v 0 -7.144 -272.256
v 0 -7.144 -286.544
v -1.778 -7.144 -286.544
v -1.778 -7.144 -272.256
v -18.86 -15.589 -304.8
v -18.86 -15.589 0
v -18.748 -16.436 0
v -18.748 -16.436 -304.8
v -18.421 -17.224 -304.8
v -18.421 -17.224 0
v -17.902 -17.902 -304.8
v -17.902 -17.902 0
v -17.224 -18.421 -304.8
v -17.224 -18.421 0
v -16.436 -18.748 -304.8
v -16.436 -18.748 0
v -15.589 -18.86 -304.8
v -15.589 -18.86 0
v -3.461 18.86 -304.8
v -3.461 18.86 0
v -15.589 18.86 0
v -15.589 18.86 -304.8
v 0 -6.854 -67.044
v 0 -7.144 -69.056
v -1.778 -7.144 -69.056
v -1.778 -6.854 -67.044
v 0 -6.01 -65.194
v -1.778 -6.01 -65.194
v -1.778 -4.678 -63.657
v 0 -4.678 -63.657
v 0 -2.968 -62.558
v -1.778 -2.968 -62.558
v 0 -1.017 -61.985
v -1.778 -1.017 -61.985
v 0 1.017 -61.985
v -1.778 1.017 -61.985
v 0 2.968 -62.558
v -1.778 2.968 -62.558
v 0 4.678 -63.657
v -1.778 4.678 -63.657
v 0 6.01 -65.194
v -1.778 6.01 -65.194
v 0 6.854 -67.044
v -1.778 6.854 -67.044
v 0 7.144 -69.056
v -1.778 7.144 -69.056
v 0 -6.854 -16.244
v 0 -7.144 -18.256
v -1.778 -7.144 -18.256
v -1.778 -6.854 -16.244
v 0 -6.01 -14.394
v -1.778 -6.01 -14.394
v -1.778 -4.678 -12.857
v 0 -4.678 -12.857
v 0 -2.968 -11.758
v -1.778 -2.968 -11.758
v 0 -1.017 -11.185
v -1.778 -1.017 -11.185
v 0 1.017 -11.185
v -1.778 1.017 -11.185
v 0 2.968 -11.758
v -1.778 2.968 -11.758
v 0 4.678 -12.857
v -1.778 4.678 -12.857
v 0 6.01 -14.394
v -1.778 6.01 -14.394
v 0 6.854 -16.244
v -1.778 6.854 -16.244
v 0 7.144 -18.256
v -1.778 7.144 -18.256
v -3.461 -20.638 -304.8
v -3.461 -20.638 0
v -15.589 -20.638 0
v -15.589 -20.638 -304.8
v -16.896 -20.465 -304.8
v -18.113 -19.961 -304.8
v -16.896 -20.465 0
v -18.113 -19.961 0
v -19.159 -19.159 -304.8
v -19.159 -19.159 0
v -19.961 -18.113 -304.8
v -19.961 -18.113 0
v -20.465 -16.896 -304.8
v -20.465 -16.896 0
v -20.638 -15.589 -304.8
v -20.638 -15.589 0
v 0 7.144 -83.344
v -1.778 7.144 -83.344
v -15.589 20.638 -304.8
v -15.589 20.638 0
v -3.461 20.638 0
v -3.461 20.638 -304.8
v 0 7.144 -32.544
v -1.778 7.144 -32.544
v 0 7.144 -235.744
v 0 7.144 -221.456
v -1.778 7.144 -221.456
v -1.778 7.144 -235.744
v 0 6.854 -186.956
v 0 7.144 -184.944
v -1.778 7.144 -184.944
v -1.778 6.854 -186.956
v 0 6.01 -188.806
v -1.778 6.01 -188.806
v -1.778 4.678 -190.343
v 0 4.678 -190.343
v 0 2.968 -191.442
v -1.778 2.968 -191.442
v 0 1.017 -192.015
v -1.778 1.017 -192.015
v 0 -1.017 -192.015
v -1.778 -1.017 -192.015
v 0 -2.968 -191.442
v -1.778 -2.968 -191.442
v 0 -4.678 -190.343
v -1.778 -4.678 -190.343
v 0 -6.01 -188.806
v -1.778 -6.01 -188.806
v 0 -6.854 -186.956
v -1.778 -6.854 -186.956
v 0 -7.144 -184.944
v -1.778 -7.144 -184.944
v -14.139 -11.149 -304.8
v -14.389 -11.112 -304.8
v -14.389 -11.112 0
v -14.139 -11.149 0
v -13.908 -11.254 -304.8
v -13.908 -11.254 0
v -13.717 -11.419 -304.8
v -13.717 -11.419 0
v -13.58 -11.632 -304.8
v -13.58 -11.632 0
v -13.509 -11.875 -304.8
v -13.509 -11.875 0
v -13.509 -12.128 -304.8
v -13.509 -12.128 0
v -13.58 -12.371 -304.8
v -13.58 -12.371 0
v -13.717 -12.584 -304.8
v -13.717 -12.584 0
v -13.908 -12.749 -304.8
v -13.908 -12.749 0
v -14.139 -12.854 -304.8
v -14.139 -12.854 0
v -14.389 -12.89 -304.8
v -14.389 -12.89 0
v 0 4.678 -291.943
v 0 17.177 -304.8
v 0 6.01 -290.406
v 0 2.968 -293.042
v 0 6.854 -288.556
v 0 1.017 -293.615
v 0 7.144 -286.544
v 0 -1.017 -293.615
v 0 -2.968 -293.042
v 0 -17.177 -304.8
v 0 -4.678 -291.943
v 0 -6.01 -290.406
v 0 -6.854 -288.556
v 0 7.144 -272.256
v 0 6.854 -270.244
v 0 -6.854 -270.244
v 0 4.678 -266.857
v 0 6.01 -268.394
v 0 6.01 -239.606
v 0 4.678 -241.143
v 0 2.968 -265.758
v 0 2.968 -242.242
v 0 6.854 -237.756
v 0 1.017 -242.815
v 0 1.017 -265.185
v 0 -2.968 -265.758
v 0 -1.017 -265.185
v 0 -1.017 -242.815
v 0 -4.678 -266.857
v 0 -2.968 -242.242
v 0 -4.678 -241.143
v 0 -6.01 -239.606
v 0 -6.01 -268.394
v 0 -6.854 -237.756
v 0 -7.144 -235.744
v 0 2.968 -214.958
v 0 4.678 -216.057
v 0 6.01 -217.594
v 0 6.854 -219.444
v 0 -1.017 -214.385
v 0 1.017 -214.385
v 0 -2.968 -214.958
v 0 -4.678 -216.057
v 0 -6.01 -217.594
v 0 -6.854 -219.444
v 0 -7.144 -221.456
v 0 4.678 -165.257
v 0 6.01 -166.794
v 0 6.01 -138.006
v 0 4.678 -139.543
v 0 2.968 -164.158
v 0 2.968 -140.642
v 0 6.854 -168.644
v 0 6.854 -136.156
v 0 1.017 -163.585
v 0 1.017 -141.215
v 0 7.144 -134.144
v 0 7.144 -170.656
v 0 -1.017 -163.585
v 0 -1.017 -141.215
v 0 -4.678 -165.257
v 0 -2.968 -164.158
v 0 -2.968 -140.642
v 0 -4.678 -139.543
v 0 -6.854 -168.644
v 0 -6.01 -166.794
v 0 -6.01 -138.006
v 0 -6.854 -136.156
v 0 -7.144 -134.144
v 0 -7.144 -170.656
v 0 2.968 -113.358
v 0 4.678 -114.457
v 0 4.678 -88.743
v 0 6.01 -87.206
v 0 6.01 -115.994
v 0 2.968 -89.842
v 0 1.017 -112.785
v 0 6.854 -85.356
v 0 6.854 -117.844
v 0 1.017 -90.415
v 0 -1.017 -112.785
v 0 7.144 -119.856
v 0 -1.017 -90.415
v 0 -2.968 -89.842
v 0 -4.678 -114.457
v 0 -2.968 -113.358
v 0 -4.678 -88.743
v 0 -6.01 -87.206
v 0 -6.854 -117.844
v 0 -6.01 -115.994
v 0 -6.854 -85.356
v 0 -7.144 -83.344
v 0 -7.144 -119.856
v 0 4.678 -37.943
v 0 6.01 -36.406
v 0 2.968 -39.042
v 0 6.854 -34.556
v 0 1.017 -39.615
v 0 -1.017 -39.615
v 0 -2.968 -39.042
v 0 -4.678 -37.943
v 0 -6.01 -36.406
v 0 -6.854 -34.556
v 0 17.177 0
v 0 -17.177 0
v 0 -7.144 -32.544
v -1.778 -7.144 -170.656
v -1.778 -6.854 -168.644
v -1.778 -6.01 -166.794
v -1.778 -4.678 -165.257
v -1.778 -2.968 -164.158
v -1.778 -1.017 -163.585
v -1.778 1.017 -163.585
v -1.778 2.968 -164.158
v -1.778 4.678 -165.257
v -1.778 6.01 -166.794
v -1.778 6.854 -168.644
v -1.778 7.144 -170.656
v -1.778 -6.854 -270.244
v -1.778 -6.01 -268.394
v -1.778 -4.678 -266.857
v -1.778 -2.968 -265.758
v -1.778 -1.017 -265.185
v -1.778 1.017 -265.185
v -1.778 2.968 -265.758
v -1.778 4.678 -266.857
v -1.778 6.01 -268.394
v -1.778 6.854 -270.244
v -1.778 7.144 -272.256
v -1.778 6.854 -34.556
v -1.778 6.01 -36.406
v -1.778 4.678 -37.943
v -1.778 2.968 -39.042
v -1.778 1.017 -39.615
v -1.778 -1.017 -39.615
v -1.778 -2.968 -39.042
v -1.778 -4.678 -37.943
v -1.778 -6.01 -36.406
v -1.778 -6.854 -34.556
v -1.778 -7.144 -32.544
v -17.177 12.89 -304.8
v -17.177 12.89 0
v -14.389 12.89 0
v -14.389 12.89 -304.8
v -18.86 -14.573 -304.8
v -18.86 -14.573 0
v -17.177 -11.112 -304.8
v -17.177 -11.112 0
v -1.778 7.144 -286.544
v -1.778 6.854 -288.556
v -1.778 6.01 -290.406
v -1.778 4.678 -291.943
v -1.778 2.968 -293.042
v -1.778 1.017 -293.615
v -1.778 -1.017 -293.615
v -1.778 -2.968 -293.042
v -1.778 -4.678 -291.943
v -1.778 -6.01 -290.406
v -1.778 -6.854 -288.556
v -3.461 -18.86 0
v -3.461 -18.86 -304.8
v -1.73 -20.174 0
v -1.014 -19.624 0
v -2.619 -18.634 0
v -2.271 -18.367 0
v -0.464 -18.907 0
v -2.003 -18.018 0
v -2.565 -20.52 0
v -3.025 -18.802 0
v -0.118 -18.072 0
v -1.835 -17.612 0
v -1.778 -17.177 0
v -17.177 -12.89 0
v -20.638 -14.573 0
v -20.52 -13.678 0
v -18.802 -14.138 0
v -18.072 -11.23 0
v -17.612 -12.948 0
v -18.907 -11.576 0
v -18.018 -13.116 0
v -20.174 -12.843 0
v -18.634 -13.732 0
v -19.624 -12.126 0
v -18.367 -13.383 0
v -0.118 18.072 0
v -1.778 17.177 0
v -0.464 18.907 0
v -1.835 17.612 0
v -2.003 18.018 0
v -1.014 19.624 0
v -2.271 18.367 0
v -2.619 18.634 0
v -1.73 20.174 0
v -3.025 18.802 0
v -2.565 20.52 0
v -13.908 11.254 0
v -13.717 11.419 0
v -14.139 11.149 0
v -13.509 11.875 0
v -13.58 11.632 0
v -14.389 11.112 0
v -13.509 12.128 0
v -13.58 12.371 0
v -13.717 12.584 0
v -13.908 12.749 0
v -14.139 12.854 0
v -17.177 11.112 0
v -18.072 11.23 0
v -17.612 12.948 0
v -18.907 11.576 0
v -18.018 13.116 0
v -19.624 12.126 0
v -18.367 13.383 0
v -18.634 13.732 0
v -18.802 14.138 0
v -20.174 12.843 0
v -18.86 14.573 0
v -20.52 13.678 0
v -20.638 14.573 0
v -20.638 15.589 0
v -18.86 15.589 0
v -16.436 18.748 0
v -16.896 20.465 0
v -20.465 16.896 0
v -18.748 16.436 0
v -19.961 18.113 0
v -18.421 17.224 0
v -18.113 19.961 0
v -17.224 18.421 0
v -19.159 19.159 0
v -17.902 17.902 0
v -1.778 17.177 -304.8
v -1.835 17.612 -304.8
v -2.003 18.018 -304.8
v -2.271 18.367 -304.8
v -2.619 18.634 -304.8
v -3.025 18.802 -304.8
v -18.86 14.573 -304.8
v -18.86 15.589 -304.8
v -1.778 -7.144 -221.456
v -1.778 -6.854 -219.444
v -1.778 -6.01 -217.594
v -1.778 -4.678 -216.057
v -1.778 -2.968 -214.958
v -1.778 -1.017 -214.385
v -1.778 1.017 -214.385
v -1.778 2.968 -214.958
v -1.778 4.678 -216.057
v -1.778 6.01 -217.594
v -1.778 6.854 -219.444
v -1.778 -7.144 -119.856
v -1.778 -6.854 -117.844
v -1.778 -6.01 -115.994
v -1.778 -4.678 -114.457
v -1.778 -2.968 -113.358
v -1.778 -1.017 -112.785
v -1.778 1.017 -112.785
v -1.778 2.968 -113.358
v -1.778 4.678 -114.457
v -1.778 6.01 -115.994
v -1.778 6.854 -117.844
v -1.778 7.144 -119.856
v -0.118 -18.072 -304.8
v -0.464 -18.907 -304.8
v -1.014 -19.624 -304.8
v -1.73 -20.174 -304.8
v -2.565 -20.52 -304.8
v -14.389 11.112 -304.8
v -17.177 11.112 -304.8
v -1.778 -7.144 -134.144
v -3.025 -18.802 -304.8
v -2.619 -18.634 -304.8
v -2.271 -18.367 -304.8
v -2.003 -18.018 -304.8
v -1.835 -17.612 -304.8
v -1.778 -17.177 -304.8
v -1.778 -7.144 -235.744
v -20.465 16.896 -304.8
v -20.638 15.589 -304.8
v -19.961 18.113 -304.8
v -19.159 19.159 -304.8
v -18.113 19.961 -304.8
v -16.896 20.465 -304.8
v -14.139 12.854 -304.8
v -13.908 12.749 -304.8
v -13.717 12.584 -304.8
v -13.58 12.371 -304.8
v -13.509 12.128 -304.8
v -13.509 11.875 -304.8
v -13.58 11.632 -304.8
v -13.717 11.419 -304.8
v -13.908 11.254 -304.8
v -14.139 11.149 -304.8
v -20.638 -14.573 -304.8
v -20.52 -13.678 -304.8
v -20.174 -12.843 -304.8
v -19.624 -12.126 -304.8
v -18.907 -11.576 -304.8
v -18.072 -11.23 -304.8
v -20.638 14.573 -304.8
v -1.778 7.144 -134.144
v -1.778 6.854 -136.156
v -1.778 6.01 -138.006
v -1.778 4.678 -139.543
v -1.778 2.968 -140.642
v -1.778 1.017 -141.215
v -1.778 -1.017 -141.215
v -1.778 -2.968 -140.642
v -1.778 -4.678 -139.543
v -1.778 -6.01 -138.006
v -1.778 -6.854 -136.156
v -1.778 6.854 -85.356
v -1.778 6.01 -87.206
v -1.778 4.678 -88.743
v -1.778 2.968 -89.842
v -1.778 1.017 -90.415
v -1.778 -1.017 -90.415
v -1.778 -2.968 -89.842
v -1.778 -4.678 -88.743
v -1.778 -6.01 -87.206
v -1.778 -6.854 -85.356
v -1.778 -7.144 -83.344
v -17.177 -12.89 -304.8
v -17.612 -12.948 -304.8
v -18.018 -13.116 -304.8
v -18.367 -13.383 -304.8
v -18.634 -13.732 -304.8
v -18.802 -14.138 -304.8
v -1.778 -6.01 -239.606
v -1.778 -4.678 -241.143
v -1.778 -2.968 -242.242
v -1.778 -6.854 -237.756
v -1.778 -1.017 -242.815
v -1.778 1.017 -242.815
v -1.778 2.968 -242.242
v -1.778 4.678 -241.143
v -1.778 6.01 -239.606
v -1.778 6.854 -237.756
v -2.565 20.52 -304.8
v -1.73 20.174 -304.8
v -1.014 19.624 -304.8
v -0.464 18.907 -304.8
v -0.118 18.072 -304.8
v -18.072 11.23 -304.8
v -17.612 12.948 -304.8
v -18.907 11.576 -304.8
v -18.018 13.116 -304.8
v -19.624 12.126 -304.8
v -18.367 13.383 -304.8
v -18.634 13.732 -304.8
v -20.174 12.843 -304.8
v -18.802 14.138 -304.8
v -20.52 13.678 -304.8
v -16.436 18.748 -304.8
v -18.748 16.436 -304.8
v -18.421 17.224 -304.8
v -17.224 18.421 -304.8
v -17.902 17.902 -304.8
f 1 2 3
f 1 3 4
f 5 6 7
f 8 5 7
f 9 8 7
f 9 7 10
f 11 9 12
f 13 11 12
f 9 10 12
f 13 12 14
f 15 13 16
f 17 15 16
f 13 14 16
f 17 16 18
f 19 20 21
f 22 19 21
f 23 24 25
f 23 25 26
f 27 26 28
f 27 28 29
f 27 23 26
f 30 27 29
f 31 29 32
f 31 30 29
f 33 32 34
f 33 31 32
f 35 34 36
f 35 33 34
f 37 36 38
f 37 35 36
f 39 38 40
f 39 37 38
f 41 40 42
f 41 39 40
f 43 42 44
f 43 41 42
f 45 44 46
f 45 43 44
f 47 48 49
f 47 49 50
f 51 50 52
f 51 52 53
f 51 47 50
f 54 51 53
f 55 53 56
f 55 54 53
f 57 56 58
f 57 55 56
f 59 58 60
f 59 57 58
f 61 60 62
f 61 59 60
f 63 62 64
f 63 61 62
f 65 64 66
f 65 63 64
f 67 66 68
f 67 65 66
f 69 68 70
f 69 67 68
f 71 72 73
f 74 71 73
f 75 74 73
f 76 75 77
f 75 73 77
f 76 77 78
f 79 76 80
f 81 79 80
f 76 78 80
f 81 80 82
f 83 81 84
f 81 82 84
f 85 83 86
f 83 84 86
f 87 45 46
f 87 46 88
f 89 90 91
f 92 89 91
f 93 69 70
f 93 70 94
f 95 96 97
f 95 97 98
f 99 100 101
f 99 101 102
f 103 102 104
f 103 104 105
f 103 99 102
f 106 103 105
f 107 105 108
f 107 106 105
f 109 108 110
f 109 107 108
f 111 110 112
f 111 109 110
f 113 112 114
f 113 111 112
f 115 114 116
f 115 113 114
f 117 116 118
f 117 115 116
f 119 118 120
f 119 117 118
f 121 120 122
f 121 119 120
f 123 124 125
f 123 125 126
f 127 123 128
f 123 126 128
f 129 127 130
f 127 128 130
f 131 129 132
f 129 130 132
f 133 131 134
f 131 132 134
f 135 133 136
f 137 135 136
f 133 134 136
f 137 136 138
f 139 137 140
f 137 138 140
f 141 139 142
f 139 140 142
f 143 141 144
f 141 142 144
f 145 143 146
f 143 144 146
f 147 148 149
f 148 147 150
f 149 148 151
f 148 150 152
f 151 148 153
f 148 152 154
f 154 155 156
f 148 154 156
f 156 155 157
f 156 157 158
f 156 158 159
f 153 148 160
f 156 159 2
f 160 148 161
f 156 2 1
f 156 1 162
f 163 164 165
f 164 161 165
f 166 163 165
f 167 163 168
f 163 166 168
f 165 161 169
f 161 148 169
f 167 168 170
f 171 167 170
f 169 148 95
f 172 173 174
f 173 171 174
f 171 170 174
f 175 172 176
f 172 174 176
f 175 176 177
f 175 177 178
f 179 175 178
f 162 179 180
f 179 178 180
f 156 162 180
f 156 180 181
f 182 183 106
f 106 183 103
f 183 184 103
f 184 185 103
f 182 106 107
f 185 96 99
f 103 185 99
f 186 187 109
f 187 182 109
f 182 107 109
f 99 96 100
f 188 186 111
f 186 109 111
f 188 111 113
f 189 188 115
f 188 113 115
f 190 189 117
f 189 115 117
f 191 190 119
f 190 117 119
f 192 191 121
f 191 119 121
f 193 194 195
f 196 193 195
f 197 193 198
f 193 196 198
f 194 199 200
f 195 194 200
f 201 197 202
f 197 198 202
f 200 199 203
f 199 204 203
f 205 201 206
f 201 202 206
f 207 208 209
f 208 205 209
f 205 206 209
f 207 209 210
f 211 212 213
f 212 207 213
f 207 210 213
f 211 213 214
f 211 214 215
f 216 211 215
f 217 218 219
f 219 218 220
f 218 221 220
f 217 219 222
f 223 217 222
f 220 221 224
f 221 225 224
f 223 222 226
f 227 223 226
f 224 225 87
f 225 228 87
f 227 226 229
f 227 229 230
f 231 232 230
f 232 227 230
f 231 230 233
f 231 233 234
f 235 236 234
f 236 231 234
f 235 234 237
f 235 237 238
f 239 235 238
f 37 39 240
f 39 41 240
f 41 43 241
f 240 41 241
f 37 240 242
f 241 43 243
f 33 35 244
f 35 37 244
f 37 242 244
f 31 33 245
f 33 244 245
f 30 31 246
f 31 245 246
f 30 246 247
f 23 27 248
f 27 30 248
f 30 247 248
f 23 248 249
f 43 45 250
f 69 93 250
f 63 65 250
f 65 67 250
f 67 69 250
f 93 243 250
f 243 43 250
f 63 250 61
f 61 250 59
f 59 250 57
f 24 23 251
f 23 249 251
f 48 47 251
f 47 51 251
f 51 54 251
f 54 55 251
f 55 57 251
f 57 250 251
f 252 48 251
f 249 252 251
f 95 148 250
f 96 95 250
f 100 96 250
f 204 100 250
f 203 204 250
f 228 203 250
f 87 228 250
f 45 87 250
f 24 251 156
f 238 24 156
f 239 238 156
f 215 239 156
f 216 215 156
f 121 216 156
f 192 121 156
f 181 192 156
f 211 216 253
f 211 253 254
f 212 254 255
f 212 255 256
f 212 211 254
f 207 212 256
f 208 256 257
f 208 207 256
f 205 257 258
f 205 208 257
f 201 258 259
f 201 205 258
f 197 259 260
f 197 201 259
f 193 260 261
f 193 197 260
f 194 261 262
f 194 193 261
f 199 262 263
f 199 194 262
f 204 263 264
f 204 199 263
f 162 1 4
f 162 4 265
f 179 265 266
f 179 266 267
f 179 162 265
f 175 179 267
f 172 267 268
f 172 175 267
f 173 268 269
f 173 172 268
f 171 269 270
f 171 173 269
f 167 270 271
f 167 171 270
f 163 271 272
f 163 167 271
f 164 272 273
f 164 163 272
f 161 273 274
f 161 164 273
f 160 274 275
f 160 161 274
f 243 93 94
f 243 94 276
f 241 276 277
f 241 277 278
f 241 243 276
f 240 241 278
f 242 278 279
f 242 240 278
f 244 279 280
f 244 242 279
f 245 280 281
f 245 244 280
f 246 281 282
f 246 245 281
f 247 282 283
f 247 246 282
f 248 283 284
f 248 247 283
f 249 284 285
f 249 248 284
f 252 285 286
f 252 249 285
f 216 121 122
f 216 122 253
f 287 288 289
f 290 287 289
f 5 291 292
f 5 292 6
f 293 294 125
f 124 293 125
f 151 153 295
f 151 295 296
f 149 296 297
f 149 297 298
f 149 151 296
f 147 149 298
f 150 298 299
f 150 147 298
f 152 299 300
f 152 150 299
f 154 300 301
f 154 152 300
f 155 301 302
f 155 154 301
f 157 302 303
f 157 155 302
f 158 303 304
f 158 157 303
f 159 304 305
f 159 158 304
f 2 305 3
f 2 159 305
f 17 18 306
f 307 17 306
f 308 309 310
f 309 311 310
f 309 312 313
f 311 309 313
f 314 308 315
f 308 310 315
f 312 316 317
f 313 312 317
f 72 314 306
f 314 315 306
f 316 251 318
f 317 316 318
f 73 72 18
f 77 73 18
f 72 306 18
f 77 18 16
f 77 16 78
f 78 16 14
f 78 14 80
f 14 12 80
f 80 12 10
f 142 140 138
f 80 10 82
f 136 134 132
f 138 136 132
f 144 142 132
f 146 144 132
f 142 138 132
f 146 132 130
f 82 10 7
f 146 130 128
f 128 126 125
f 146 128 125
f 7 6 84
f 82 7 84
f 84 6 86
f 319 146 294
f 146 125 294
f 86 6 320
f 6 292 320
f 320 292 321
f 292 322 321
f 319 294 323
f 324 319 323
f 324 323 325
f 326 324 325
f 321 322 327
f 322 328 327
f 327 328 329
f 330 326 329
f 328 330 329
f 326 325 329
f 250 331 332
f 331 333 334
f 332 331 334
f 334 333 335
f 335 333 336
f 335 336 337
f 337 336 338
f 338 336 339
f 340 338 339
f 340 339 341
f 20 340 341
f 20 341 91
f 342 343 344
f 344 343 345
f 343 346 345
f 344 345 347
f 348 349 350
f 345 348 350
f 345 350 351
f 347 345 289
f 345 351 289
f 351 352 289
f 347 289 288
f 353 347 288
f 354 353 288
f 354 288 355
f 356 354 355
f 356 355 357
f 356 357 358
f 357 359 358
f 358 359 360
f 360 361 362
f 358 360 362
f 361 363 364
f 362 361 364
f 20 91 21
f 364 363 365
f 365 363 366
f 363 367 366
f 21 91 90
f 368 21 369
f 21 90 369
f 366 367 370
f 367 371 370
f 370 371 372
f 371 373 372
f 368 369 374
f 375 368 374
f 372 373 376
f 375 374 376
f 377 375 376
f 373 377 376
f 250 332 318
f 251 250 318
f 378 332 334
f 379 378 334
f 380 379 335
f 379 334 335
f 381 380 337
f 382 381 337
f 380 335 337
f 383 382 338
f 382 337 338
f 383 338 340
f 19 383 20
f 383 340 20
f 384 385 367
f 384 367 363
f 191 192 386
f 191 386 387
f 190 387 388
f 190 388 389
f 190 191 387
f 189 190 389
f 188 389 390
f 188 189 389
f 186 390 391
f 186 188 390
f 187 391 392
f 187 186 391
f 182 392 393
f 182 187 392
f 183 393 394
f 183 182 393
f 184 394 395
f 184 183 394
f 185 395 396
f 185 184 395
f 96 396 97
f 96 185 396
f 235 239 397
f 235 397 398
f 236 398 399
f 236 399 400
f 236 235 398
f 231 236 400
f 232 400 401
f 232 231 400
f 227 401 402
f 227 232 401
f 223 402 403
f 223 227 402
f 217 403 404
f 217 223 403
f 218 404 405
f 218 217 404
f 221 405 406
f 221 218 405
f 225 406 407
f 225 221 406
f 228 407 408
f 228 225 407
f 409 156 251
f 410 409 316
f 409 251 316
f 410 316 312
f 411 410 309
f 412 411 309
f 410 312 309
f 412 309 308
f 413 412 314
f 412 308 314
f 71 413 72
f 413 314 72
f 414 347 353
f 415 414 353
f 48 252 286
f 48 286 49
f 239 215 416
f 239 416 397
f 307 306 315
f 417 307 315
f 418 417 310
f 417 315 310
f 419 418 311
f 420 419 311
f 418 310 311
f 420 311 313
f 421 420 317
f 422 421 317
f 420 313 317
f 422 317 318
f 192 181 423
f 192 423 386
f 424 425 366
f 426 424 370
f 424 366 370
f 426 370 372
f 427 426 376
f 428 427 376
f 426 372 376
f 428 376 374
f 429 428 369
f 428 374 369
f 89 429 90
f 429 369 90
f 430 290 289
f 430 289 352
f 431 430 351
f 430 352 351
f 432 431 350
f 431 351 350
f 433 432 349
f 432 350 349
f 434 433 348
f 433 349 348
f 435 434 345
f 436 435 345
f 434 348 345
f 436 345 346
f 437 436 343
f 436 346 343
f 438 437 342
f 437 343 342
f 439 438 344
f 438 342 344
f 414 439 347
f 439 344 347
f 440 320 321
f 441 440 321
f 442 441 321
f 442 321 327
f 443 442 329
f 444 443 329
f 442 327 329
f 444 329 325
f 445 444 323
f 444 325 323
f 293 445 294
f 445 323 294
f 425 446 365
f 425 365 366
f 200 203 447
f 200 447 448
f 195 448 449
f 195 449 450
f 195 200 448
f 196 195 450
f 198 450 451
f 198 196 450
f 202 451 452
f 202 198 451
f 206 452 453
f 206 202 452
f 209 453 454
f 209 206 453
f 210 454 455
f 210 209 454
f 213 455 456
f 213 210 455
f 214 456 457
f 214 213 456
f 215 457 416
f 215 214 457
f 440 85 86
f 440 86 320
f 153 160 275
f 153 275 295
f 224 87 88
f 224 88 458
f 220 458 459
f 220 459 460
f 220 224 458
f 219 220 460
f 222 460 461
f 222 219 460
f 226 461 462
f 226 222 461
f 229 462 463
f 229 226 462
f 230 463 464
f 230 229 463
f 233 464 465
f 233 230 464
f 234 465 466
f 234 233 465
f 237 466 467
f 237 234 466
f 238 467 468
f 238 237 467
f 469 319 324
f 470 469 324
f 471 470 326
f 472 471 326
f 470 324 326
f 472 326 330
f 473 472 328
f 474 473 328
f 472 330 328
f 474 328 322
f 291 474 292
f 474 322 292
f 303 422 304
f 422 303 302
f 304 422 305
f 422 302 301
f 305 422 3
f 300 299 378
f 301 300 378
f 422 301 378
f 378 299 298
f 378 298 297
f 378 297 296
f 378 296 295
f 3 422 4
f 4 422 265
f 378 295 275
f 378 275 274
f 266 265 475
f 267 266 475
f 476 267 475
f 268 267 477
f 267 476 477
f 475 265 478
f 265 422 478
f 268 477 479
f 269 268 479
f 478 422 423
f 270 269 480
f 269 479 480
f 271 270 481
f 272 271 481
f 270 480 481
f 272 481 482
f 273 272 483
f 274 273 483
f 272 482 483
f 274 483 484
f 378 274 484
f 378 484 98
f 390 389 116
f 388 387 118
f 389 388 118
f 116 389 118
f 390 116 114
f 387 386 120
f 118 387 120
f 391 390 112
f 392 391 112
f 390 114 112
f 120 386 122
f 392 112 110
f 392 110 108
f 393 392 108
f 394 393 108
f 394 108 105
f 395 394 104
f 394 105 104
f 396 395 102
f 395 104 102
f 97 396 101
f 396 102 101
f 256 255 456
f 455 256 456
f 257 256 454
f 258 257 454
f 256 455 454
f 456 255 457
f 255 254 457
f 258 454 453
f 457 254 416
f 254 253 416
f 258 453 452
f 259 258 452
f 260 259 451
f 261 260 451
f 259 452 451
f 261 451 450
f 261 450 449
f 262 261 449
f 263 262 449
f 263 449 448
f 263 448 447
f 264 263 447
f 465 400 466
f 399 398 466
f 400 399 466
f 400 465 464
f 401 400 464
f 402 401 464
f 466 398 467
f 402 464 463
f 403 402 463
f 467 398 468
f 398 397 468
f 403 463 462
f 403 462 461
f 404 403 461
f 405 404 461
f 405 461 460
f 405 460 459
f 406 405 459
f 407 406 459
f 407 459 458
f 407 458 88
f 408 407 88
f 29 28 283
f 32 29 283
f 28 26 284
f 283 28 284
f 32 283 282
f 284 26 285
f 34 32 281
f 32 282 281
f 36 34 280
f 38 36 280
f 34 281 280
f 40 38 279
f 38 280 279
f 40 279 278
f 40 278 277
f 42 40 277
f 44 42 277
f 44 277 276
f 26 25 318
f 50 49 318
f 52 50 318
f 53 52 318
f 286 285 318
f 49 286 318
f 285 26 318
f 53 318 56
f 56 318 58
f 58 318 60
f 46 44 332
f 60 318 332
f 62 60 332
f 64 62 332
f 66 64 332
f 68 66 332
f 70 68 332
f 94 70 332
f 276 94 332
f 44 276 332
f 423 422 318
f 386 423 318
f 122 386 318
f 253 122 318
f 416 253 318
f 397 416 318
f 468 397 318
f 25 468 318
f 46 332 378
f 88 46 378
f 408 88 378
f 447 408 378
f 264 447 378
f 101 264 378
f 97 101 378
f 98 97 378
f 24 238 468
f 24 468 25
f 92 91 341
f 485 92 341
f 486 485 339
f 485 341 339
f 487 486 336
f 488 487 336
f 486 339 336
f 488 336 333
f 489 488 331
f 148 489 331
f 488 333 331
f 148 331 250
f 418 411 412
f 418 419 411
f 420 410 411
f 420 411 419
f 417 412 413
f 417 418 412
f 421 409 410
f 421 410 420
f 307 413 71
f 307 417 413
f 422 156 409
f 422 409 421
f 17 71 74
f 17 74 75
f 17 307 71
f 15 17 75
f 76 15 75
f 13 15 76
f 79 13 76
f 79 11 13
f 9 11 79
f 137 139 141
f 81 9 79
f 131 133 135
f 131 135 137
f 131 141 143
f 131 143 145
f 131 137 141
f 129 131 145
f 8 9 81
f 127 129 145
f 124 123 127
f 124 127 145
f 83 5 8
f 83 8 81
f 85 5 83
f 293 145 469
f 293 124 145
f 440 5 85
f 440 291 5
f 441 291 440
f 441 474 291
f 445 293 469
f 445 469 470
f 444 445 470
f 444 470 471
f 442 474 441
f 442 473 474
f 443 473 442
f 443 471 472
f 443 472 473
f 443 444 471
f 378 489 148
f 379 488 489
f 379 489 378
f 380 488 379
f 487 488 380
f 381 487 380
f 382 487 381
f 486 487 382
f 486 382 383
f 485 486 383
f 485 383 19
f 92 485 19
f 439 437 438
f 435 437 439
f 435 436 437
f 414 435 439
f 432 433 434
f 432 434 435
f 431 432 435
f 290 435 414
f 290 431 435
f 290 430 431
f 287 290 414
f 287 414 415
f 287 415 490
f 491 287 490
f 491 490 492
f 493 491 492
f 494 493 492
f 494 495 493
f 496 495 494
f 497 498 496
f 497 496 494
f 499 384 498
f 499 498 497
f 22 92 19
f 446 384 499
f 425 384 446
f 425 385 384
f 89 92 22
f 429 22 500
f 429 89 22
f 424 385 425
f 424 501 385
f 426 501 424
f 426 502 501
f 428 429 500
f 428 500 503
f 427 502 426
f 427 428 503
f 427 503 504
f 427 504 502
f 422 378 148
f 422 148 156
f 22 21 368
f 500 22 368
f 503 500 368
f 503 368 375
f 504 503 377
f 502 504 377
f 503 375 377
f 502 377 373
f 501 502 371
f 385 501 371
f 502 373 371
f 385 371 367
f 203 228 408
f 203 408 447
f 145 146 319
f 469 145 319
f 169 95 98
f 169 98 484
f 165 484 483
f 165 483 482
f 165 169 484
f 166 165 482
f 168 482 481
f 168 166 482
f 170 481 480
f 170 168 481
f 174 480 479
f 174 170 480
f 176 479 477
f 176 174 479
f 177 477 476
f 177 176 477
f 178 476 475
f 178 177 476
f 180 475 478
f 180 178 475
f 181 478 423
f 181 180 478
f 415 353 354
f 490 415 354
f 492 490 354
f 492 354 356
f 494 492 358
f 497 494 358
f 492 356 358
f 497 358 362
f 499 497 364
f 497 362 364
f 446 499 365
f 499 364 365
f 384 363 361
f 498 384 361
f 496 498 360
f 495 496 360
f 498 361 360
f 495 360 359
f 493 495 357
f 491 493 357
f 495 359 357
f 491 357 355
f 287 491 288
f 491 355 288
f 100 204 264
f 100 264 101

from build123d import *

# Parameters (mm, degrees)
BOSS_EXTRUDE1_DEPTH = 304.8
CUT_EXTRUDE1_DEPTH  = 1.778
LPATTERN1_COUNT     = 6
LPATTERN1_PITCH     = 50.8


with BuildPart() as part:
    # Sketch1 → Boss-Extrude1 (new body)
    with BuildSketch(Plane.XY):
        with BuildLine():
            Line((-15.58925, 20.6375), (-3.46075, 20.6375))
            ThreePointArc((-3.46075, 20.6375), (-1.013630207, 19.623869793), (0, 17.17675))
            Line((0, 17.17675), (0, -17.17675))
            ThreePointArc((0, -17.17675), (-1.013630207, -19.623869793), (-3.46075, -20.6375))
            Line((-3.46075, -20.6375), (-15.58925, -20.6375))
            ThreePointArc((-15.58925, -20.6375), (-19.158901808, -19.158901808), (-20.6375, -15.58925))
            Line((-20.6375, -15.58925), (-20.6375, -14.57325))
            ThreePointArc((-20.6375, -14.57325), (-19.623869793, -12.126130207), (-17.17675, -11.1125))
            Line((-17.17675, -11.1125), (-14.3891, -11.1125))
            ThreePointArc((-14.3891, -11.1125), (-13.5001, -12.0015), (-14.3891, -12.8905))
            Line((-14.3891, -12.8905), (-17.17675, -12.8905))
            ThreePointArc((-17.17675, -12.8905), (-18.366633936, -13.383366064), (-18.8595, -14.57325))
            Line((-18.8595, -14.57325), (-18.8595, -15.58925))
            ThreePointArc((-18.8595, -15.58925), (-17.901665951, -17.901665951), (-15.58925, -18.8595))
            Line((-15.58925, -18.8595), (-3.46075, -18.8595))
            ThreePointArc((-3.46075, -18.8595), (-2.270866064, -18.366633936), (-1.778, -17.17675))
            Line((-1.778, -17.17675), (-1.778, 17.17675))
            ThreePointArc((-1.778, 17.17675), (-2.270866064, 18.366633936), (-3.46075, 18.8595))
            Line((-3.46075, 18.8595), (-15.58925, 18.8595))
            ThreePointArc((-15.58925, 18.8595), (-17.901665951, 17.901665951), (-18.8595, 15.58925))
            Line((-18.8595, 15.58925), (-18.8595, 14.57325))
            ThreePointArc((-18.8595, 14.57325), (-18.366633936, 13.383366064), (-17.17675, 12.8905))
            Line((-17.17675, 12.8905), (-14.3891, 12.8905))
            ThreePointArc((-14.3891, 12.8905), (-13.5001, 12.0015), (-14.3891, 11.1125))
            Line((-14.3891, 11.1125), (-17.17675, 11.1125))
            ThreePointArc((-17.17675, 11.1125), (-19.623869793, 12.126130207), (-20.6375, 14.57325))
            Line((-20.6375, 14.57325), (-20.6375, 15.58925))
            ThreePointArc((-20.6375, 15.58925), (-19.158901808, 19.158901808), (-15.58925, 20.6375))
        make_face()
    extrude(amount=-BOSS_EXTRUDE1_DEPTH)

    # Sketch2 → Cut-Extrude1 (cut)
    with BuildSketch(Plane(origin=(0, 0, 0), x_dir=(0, 0, -1), z_dir=(1, 0, 0))):
        with BuildLine():
            Line((18.25625, 7.14375), (32.54375, 7.14375))
            ThreePointArc((32.54375, 7.14375), (39.6875, 0), (32.54375, -7.14375))
            Line((32.54375, -7.14375), (18.25625, -7.14375))
            ThreePointArc((18.25625, -7.14375), (11.1125, 0), (18.25625, 7.14375))
        make_face()
    cut_extrude1 = extrude(amount=-CUT_EXTRUDE1_DEPTH, mode=Mode.SUBTRACT)

    # LPattern1: Cut-Extrude1 ×6
    with Locations(*[(0, 0, -i * LPATTERN1_PITCH) for i in range(1, LPATTERN1_COUNT)]):
        add(cut_extrude1, mode=Mode.SUBTRACT)


solid = part.part
